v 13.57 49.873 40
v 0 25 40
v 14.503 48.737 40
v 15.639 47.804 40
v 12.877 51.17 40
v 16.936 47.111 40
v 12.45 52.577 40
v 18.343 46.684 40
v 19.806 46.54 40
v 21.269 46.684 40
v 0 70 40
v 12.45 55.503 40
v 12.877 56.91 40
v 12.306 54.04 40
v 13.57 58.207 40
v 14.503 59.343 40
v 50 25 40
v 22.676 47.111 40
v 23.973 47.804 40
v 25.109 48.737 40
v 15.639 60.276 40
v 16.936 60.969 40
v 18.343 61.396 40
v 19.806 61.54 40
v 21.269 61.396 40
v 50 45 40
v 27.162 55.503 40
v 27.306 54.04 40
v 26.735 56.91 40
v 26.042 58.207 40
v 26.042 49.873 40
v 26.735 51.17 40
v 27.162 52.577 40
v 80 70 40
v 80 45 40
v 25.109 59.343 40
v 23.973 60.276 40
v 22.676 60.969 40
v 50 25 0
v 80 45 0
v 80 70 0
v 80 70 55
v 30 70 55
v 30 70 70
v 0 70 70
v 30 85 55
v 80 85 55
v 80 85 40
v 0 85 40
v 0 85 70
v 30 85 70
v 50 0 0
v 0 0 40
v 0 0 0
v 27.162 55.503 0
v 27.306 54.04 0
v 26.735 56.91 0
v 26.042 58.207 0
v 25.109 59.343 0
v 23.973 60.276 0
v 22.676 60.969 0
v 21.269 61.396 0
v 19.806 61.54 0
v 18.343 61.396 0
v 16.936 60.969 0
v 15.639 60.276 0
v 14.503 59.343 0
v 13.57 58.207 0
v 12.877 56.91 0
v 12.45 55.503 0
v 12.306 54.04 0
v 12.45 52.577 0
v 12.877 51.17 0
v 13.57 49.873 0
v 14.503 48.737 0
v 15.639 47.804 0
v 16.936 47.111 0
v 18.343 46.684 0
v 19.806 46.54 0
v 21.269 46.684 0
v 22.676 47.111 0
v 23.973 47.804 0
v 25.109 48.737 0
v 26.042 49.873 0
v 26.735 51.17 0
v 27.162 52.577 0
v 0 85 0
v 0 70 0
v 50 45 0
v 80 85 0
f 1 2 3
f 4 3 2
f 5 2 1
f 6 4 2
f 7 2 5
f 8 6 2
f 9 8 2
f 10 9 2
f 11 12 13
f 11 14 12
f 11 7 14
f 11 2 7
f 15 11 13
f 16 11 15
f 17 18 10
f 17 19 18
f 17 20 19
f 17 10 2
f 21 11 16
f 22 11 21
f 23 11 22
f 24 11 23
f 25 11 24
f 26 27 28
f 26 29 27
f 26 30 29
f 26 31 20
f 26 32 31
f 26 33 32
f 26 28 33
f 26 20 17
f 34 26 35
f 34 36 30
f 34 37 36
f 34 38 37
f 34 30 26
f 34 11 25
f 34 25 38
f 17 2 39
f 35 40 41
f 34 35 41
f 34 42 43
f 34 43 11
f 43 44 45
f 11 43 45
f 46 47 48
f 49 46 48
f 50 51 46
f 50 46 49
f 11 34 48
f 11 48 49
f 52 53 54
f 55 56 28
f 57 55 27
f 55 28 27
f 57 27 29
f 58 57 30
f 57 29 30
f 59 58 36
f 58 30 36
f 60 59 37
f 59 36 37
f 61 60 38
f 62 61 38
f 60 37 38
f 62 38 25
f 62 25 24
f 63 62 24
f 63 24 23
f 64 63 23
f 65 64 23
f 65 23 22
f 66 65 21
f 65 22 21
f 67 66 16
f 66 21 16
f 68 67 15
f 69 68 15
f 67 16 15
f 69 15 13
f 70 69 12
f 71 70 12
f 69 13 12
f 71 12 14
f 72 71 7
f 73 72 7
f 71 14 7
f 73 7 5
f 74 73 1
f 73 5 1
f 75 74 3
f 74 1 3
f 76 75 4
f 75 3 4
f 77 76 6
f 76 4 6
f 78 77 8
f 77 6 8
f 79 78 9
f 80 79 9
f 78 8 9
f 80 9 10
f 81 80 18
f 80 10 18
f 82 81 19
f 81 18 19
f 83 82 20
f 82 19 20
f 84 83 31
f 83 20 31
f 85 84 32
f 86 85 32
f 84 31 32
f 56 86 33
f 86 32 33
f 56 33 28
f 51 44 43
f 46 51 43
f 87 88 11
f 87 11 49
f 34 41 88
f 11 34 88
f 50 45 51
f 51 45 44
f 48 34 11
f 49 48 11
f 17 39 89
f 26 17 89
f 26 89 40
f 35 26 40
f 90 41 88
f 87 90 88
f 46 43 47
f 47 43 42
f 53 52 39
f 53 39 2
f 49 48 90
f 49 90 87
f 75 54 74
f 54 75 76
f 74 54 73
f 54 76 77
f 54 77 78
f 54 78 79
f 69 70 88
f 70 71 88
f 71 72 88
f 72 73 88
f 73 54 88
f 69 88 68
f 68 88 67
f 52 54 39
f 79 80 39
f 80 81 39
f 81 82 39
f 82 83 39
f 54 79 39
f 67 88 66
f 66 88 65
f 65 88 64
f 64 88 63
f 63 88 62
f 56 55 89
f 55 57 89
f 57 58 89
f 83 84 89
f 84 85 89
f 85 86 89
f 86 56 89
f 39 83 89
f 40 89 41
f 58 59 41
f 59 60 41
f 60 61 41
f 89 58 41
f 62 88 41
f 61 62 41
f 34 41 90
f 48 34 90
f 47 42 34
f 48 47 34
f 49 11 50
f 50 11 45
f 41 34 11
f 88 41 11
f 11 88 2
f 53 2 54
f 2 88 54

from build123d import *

# Parameters (mm, degrees)
F1_DEPTH = 25
F3_DEPTH = 40
F5_DEPTH = 15
F6_DEPTH = 40
F7_R     = 7.5
F8_DEPTH = 40


with BuildPart() as f1:
    # F0 (on Front) → F1 (new body)
    with BuildSketch(Plane.XZ):
        Polygon((0, 40), (0, 0), (50, 0), align=None)
    extrude(amount=-F1_DEPTH)

    # F2 (on Top) → F3 (join)
    with BuildSketch(Plane.XY):
        Polygon((0, 70), (0, 25), (50, 25), (50, 45), (80, 45), (80, 70), align=None)
    extrude(amount=F3_DEPTH)

    # F7 (on face) → F8 (cut, through all)
    with BuildSketch(Plane.XY.offset(40)):
        with Locations((19.8061428964, 54.0399923921)):
            Circle(F7_R)
    extrude(amount=-F8_DEPTH, mode=Mode.SUBTRACT)


with BuildPart() as f5:
    # F4 (on face) → F5 (new body)
    with BuildSketch(Plane(origin=(0, 70, 0), x_dir=(-1, 0, 0), z_dir=(0, 1, 0))):
        Polygon((-80, 40), (0, 40), (0, 70), (-30, 70), (-30, 55), (-80, 55), align=None)
    extrude(amount=F5_DEPTH)


with BuildPart() as f6:
    # F6 (new): a face of the model
    f6_faces = [f5.part.faces().sort_by_distance(p)[0] for p in [
        (40, 77.5, 40),
    ]]
    extrude(f6_faces, amount=F6_DEPTH)


solid = Compound([f1.part, f5.part, f6.part])
